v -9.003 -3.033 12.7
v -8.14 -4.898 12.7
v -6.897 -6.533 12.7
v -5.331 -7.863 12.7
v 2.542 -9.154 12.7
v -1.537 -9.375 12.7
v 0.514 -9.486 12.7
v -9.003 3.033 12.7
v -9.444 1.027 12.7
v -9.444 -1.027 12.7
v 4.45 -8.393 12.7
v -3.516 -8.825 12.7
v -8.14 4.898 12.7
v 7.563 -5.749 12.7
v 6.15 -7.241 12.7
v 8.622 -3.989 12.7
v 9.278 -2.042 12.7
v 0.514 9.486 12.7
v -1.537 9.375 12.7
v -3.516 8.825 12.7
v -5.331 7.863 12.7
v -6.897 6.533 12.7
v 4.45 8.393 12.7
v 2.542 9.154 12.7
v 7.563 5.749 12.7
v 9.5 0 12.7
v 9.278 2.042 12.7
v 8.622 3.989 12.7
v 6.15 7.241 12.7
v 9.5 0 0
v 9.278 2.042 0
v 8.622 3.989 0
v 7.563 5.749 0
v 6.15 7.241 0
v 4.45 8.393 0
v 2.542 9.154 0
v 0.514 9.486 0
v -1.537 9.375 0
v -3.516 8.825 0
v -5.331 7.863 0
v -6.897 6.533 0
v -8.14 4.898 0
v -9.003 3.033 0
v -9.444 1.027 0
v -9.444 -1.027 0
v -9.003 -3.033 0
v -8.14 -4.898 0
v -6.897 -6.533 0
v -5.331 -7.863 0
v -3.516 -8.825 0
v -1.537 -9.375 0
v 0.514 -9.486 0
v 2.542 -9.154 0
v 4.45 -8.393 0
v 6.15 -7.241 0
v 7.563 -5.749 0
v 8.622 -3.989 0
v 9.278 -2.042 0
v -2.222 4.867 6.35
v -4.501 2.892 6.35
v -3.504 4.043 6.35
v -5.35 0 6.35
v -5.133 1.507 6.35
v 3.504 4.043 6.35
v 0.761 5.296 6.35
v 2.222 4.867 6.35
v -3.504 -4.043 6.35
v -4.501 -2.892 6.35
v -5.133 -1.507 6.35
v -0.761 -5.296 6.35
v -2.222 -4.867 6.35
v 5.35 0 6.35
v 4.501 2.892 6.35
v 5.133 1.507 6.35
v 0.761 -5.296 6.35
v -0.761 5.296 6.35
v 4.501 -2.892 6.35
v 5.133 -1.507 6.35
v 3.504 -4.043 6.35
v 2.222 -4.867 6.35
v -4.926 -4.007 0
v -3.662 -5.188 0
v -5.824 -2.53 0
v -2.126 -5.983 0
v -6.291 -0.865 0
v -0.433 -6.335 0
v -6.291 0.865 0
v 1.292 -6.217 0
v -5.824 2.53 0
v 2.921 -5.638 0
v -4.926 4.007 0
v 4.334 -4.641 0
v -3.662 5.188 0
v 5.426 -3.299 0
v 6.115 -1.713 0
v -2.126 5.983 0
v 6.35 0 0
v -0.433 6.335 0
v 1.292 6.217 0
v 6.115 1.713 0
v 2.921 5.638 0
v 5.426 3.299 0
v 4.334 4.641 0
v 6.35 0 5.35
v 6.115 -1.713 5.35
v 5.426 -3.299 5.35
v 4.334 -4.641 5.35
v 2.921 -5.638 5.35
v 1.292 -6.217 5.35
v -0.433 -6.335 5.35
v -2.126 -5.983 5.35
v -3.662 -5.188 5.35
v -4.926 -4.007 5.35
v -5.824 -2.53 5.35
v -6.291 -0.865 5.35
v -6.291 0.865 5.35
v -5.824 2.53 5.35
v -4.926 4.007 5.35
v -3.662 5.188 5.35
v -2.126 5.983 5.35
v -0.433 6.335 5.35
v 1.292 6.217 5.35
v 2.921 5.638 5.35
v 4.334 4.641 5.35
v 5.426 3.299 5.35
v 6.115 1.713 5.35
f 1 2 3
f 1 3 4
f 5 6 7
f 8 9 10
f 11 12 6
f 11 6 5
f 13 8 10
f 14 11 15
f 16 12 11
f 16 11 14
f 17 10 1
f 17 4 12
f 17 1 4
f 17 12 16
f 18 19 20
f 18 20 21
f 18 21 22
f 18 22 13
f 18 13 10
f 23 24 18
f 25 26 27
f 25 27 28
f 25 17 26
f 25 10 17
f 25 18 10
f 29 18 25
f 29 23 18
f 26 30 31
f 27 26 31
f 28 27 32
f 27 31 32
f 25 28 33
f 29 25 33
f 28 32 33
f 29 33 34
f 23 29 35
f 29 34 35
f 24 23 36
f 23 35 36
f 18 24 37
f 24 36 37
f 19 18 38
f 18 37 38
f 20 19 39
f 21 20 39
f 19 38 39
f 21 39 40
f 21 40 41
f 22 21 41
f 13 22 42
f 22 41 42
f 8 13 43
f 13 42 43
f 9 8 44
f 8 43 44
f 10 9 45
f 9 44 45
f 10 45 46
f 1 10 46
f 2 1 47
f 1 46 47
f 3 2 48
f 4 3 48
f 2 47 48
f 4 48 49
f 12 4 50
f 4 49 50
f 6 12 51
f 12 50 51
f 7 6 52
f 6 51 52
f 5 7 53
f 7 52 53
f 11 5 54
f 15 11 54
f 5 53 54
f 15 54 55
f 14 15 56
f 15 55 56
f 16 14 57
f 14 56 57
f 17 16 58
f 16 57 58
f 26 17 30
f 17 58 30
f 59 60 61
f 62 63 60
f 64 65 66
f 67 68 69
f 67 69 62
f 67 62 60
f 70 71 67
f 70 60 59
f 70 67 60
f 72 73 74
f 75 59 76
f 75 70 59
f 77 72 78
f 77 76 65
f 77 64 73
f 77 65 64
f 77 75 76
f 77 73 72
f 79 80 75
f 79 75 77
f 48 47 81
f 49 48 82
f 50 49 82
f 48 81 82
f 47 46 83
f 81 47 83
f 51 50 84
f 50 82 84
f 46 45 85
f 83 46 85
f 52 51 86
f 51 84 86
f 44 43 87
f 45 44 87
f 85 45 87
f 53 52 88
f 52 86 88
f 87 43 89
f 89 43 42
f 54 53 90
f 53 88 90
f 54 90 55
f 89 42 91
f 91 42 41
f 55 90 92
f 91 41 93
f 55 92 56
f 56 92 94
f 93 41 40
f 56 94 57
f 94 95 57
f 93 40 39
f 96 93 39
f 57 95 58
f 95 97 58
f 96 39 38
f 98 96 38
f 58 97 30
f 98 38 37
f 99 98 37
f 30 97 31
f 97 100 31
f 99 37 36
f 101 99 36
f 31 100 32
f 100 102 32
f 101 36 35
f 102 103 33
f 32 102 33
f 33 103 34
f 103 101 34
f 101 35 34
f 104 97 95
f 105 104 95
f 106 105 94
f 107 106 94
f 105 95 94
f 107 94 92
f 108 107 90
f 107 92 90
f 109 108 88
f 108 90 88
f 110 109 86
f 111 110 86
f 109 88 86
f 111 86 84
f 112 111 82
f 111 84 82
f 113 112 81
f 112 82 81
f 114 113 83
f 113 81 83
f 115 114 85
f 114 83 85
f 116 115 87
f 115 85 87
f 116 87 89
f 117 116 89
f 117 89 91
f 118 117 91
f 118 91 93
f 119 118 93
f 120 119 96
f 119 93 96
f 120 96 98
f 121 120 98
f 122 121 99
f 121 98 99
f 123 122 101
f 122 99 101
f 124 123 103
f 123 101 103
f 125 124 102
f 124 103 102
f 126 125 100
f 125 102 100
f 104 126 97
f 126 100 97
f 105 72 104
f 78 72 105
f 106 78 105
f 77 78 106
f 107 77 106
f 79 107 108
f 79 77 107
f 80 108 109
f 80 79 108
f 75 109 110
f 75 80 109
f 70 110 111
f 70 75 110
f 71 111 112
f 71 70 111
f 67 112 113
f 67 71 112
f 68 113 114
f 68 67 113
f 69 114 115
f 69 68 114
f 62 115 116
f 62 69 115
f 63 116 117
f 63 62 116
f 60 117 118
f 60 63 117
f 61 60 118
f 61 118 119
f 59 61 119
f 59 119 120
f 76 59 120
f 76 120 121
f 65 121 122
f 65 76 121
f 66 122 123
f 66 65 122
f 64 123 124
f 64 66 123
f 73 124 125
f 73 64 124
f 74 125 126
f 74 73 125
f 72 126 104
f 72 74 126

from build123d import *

# Parameters (mm, degrees)
SKETCH_R     = 9.5
PAD_DEPTH    = 12.7
SKETCH001_R  = 6.35
POCKET_DEPTH = 6.35
CHAMFER_SIZE = 1


with BuildPart() as part:
    # Sketch → Pad (new body)
    with BuildSketch(Plane.XY):
        Circle(SKETCH_R)
    extrude(amount=PAD_DEPTH)

    # Sketch001 (on Face2 of Pad) → Pocket (cut)
    with BuildSketch(Plane(origin=(0, 0, 0), x_dir=(1, 0, 0), z_dir=(0, 0, -1))):
        Circle(SKETCH001_R)
    extrude(amount=-POCKET_DEPTH, mode=Mode.SUBTRACT)

    # Chamfer
    chamfer_edges = [part.edges().sort_by_distance(p)[0] for p in [
        (-6.35, 0, 6.35),
    ]]
    chamfer(chamfer_edges, length=CHAMFER_SIZE)


solid = part.part
